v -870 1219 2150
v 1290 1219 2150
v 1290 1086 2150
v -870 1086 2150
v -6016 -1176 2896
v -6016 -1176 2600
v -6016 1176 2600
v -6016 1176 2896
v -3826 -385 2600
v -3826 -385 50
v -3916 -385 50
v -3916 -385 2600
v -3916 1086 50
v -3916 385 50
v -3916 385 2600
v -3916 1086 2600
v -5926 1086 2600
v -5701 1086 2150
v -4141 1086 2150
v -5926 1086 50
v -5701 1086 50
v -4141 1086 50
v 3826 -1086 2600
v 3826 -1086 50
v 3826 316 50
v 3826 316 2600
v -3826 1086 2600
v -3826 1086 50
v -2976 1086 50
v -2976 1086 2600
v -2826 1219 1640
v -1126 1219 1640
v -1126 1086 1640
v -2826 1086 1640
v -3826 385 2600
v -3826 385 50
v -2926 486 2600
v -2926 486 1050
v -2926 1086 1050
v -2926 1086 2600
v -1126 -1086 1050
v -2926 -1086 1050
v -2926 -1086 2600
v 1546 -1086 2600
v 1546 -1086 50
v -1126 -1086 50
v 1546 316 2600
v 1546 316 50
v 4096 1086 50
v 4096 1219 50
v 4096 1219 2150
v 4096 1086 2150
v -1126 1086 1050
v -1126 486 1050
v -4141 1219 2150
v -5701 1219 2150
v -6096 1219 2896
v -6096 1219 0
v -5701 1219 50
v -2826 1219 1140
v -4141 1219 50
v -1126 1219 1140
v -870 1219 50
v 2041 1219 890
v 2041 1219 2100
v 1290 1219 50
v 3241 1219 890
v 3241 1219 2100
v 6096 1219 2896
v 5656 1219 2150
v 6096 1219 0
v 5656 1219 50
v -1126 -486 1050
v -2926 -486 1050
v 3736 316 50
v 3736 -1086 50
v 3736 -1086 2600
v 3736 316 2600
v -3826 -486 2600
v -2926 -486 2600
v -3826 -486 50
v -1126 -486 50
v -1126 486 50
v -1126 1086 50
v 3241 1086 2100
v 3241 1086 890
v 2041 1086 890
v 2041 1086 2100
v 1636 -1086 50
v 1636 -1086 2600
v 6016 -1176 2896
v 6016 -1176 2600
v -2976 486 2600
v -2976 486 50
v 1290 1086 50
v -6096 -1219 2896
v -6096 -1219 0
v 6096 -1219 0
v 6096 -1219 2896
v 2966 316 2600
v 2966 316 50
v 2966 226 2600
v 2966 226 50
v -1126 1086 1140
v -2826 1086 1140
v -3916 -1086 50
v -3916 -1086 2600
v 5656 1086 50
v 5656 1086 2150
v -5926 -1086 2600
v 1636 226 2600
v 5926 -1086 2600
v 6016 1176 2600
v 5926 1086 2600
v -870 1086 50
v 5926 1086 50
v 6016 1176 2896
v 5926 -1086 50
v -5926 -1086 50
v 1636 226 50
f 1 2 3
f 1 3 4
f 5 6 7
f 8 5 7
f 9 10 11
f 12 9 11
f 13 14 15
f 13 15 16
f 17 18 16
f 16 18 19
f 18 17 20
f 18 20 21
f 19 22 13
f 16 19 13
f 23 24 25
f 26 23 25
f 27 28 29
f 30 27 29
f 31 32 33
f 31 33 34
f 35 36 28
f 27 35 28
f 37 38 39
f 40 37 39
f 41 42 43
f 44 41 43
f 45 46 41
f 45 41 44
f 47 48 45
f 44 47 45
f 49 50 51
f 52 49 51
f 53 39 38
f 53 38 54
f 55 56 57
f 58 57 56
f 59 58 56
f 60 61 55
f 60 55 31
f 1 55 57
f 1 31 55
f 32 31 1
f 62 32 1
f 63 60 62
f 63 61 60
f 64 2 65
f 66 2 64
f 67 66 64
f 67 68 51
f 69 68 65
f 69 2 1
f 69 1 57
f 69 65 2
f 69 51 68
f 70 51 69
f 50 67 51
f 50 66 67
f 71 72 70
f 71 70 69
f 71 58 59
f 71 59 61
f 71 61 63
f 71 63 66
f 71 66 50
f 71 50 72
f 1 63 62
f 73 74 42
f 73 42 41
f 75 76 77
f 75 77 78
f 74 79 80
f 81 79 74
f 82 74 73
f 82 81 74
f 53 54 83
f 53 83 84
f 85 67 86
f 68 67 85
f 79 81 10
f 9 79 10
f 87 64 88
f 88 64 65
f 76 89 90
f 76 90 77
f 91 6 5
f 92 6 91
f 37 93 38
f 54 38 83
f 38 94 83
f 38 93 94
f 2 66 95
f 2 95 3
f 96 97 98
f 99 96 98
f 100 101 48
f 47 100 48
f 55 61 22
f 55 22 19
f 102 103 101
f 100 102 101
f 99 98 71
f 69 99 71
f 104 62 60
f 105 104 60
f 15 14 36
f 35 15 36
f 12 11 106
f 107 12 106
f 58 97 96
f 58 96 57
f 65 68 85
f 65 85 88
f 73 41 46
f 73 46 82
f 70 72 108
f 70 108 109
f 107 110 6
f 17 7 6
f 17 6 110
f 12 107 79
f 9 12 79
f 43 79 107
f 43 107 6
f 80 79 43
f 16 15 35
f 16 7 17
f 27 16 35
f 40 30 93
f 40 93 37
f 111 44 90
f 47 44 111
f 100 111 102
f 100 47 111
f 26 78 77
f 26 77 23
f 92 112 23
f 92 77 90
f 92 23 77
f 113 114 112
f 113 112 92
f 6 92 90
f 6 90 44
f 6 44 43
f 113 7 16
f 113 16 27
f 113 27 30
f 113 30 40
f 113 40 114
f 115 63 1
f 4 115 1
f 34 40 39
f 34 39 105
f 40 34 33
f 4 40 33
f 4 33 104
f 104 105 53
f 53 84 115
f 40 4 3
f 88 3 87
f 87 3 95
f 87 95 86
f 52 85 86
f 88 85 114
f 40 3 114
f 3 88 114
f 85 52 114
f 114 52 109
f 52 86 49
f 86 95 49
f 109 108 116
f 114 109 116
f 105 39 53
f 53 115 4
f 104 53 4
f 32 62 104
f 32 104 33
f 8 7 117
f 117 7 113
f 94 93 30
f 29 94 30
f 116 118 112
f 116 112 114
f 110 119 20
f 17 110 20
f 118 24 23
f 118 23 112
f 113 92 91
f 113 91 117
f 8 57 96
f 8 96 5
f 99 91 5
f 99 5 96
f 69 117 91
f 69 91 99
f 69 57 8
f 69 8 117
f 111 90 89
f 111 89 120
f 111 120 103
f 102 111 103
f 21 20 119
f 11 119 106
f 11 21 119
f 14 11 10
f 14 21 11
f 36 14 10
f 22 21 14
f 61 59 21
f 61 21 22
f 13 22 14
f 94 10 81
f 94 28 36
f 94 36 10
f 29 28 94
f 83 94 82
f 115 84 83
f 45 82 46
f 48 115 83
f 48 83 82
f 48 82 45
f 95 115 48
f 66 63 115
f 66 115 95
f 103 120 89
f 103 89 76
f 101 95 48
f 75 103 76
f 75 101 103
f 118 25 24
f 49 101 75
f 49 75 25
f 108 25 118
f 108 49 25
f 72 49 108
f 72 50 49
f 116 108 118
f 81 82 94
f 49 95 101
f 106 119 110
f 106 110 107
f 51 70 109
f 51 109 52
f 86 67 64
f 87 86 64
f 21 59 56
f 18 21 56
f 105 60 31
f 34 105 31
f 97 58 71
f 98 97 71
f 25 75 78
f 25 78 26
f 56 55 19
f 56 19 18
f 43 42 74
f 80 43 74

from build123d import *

# Parameters (mm, degrees)
F0_W      = 12192
F0_H      = 2438
F0_W_2    = 12032
F0_H_2    = 2352
F1_DEPTH  = 2896
F2_DEPTH  = 50
F3_W      = 11852
F3_H      = 2172
F4_DEPTH  = 2550
F5_W      = 90
F5_H      = 701
F5_H_2    = 1402
F5_W_2    = 50
F5_H_3    = 600
F6_DEPTH  = 2550
F5_W_3    = 1800
F7_DEPTH  = 1000
F5_W_4    = 900
F8_DEPTH  = 2550
F9_W      = 2160
F9_H      = 2100
F9_W_2    = 1700
F9_H_2    = 500
F9_W_3    = 1560
F9_W_4    = 1200
F9_H_3    = 1210
F10_DEPTH = 135


with BuildPart() as f1:
    # F0 (on Top) → F1 (new body)
    with BuildSketch(Plane.XY):
        Rectangle(F0_W, F0_H)
        Rectangle(F0_W_2, F0_H_2, mode=Mode.SUBTRACT)
    extrude(amount=F1_DEPTH)

    # F0 (on Top) → F2 (join)
    with BuildSketch(Plane.XY):
        Rectangle(F0_W_2, F0_H_2)
    extrude(amount=F2_DEPTH)

    # F3 (on face) → F4 (join)
    with BuildSketch(Plane.XY.offset(50)):
        Polygon((-5926, 1176), (-6016, 1176), (-6016, -1176), (-5926, -1176), (5926, -1176), (6016, -1176), (6016, 1176), align=None)
        Rectangle(F3_W, F3_H, mode=Mode.SUBTRACT)
    extrude(amount=F4_DEPTH)

    # F5 (on face) → F6 (join)
    with BuildSketch(Plane.XY.offset(50)):
        with Locations((-3871, 735.5)):
            Rectangle(F5_W, F5_H)
        Polygon((-3916, -385), (-3916, -1086), (-3826, -1086), (-3826, -486), (-3826, -385), align=None)
        Polygon((1546, 316), (1546, -1086), (1636, -1086), (1636, 226), (2966, 226), (2966, 316), (1636, 316), align=None)
        with Locations((3781, -385)):
            Rectangle(F5_W, F5_H_2)
        with Locations((-2951, 786)):
            Rectangle(F5_W_2, F5_H_3)
    extrude(amount=F6_DEPTH)

    # F5 (on face) → F7 (join)
    with BuildSketch(Plane.XY.offset(50)):
        with Locations((-2026, -786)):
            Rectangle(F5_W_3, F5_H_3)
        with Locations((-2026, 786)):
            Rectangle(F5_W_3, F5_H_3)
    extrude(amount=F7_DEPTH)

    # F5 (on face) → F8 (join)
    with BuildSketch(Plane.XY.offset(50)):
        with Locations((-3376, -786)):
            Rectangle(F5_W_4, F5_H_3)
    extrude(amount=F8_DEPTH)

    # F9 (on face) → F10 (cut)
    with BuildSketch(Plane(origin=(0, 1219, 0), x_dir=(-1, 0, 0), z_dir=(0, 1, 0))):
        with Locations((-210, 1100)):
            Rectangle(F9_W, F9_H)
        with Locations((1976, 1390)):
            Rectangle(F9_W_2, F9_H_2)
        with Locations((-4876, 1100)):
            Rectangle(F9_W_3, F9_H)
        with Locations((4921, 1100)):
            Rectangle(F9_W_3, F9_H)
        with Locations((-2641, 1495)):
            Rectangle(F9_W_4, F9_H_3)
    extrude(amount=-F10_DEPTH, mode=Mode.SUBTRACT)


solid = f1.part
